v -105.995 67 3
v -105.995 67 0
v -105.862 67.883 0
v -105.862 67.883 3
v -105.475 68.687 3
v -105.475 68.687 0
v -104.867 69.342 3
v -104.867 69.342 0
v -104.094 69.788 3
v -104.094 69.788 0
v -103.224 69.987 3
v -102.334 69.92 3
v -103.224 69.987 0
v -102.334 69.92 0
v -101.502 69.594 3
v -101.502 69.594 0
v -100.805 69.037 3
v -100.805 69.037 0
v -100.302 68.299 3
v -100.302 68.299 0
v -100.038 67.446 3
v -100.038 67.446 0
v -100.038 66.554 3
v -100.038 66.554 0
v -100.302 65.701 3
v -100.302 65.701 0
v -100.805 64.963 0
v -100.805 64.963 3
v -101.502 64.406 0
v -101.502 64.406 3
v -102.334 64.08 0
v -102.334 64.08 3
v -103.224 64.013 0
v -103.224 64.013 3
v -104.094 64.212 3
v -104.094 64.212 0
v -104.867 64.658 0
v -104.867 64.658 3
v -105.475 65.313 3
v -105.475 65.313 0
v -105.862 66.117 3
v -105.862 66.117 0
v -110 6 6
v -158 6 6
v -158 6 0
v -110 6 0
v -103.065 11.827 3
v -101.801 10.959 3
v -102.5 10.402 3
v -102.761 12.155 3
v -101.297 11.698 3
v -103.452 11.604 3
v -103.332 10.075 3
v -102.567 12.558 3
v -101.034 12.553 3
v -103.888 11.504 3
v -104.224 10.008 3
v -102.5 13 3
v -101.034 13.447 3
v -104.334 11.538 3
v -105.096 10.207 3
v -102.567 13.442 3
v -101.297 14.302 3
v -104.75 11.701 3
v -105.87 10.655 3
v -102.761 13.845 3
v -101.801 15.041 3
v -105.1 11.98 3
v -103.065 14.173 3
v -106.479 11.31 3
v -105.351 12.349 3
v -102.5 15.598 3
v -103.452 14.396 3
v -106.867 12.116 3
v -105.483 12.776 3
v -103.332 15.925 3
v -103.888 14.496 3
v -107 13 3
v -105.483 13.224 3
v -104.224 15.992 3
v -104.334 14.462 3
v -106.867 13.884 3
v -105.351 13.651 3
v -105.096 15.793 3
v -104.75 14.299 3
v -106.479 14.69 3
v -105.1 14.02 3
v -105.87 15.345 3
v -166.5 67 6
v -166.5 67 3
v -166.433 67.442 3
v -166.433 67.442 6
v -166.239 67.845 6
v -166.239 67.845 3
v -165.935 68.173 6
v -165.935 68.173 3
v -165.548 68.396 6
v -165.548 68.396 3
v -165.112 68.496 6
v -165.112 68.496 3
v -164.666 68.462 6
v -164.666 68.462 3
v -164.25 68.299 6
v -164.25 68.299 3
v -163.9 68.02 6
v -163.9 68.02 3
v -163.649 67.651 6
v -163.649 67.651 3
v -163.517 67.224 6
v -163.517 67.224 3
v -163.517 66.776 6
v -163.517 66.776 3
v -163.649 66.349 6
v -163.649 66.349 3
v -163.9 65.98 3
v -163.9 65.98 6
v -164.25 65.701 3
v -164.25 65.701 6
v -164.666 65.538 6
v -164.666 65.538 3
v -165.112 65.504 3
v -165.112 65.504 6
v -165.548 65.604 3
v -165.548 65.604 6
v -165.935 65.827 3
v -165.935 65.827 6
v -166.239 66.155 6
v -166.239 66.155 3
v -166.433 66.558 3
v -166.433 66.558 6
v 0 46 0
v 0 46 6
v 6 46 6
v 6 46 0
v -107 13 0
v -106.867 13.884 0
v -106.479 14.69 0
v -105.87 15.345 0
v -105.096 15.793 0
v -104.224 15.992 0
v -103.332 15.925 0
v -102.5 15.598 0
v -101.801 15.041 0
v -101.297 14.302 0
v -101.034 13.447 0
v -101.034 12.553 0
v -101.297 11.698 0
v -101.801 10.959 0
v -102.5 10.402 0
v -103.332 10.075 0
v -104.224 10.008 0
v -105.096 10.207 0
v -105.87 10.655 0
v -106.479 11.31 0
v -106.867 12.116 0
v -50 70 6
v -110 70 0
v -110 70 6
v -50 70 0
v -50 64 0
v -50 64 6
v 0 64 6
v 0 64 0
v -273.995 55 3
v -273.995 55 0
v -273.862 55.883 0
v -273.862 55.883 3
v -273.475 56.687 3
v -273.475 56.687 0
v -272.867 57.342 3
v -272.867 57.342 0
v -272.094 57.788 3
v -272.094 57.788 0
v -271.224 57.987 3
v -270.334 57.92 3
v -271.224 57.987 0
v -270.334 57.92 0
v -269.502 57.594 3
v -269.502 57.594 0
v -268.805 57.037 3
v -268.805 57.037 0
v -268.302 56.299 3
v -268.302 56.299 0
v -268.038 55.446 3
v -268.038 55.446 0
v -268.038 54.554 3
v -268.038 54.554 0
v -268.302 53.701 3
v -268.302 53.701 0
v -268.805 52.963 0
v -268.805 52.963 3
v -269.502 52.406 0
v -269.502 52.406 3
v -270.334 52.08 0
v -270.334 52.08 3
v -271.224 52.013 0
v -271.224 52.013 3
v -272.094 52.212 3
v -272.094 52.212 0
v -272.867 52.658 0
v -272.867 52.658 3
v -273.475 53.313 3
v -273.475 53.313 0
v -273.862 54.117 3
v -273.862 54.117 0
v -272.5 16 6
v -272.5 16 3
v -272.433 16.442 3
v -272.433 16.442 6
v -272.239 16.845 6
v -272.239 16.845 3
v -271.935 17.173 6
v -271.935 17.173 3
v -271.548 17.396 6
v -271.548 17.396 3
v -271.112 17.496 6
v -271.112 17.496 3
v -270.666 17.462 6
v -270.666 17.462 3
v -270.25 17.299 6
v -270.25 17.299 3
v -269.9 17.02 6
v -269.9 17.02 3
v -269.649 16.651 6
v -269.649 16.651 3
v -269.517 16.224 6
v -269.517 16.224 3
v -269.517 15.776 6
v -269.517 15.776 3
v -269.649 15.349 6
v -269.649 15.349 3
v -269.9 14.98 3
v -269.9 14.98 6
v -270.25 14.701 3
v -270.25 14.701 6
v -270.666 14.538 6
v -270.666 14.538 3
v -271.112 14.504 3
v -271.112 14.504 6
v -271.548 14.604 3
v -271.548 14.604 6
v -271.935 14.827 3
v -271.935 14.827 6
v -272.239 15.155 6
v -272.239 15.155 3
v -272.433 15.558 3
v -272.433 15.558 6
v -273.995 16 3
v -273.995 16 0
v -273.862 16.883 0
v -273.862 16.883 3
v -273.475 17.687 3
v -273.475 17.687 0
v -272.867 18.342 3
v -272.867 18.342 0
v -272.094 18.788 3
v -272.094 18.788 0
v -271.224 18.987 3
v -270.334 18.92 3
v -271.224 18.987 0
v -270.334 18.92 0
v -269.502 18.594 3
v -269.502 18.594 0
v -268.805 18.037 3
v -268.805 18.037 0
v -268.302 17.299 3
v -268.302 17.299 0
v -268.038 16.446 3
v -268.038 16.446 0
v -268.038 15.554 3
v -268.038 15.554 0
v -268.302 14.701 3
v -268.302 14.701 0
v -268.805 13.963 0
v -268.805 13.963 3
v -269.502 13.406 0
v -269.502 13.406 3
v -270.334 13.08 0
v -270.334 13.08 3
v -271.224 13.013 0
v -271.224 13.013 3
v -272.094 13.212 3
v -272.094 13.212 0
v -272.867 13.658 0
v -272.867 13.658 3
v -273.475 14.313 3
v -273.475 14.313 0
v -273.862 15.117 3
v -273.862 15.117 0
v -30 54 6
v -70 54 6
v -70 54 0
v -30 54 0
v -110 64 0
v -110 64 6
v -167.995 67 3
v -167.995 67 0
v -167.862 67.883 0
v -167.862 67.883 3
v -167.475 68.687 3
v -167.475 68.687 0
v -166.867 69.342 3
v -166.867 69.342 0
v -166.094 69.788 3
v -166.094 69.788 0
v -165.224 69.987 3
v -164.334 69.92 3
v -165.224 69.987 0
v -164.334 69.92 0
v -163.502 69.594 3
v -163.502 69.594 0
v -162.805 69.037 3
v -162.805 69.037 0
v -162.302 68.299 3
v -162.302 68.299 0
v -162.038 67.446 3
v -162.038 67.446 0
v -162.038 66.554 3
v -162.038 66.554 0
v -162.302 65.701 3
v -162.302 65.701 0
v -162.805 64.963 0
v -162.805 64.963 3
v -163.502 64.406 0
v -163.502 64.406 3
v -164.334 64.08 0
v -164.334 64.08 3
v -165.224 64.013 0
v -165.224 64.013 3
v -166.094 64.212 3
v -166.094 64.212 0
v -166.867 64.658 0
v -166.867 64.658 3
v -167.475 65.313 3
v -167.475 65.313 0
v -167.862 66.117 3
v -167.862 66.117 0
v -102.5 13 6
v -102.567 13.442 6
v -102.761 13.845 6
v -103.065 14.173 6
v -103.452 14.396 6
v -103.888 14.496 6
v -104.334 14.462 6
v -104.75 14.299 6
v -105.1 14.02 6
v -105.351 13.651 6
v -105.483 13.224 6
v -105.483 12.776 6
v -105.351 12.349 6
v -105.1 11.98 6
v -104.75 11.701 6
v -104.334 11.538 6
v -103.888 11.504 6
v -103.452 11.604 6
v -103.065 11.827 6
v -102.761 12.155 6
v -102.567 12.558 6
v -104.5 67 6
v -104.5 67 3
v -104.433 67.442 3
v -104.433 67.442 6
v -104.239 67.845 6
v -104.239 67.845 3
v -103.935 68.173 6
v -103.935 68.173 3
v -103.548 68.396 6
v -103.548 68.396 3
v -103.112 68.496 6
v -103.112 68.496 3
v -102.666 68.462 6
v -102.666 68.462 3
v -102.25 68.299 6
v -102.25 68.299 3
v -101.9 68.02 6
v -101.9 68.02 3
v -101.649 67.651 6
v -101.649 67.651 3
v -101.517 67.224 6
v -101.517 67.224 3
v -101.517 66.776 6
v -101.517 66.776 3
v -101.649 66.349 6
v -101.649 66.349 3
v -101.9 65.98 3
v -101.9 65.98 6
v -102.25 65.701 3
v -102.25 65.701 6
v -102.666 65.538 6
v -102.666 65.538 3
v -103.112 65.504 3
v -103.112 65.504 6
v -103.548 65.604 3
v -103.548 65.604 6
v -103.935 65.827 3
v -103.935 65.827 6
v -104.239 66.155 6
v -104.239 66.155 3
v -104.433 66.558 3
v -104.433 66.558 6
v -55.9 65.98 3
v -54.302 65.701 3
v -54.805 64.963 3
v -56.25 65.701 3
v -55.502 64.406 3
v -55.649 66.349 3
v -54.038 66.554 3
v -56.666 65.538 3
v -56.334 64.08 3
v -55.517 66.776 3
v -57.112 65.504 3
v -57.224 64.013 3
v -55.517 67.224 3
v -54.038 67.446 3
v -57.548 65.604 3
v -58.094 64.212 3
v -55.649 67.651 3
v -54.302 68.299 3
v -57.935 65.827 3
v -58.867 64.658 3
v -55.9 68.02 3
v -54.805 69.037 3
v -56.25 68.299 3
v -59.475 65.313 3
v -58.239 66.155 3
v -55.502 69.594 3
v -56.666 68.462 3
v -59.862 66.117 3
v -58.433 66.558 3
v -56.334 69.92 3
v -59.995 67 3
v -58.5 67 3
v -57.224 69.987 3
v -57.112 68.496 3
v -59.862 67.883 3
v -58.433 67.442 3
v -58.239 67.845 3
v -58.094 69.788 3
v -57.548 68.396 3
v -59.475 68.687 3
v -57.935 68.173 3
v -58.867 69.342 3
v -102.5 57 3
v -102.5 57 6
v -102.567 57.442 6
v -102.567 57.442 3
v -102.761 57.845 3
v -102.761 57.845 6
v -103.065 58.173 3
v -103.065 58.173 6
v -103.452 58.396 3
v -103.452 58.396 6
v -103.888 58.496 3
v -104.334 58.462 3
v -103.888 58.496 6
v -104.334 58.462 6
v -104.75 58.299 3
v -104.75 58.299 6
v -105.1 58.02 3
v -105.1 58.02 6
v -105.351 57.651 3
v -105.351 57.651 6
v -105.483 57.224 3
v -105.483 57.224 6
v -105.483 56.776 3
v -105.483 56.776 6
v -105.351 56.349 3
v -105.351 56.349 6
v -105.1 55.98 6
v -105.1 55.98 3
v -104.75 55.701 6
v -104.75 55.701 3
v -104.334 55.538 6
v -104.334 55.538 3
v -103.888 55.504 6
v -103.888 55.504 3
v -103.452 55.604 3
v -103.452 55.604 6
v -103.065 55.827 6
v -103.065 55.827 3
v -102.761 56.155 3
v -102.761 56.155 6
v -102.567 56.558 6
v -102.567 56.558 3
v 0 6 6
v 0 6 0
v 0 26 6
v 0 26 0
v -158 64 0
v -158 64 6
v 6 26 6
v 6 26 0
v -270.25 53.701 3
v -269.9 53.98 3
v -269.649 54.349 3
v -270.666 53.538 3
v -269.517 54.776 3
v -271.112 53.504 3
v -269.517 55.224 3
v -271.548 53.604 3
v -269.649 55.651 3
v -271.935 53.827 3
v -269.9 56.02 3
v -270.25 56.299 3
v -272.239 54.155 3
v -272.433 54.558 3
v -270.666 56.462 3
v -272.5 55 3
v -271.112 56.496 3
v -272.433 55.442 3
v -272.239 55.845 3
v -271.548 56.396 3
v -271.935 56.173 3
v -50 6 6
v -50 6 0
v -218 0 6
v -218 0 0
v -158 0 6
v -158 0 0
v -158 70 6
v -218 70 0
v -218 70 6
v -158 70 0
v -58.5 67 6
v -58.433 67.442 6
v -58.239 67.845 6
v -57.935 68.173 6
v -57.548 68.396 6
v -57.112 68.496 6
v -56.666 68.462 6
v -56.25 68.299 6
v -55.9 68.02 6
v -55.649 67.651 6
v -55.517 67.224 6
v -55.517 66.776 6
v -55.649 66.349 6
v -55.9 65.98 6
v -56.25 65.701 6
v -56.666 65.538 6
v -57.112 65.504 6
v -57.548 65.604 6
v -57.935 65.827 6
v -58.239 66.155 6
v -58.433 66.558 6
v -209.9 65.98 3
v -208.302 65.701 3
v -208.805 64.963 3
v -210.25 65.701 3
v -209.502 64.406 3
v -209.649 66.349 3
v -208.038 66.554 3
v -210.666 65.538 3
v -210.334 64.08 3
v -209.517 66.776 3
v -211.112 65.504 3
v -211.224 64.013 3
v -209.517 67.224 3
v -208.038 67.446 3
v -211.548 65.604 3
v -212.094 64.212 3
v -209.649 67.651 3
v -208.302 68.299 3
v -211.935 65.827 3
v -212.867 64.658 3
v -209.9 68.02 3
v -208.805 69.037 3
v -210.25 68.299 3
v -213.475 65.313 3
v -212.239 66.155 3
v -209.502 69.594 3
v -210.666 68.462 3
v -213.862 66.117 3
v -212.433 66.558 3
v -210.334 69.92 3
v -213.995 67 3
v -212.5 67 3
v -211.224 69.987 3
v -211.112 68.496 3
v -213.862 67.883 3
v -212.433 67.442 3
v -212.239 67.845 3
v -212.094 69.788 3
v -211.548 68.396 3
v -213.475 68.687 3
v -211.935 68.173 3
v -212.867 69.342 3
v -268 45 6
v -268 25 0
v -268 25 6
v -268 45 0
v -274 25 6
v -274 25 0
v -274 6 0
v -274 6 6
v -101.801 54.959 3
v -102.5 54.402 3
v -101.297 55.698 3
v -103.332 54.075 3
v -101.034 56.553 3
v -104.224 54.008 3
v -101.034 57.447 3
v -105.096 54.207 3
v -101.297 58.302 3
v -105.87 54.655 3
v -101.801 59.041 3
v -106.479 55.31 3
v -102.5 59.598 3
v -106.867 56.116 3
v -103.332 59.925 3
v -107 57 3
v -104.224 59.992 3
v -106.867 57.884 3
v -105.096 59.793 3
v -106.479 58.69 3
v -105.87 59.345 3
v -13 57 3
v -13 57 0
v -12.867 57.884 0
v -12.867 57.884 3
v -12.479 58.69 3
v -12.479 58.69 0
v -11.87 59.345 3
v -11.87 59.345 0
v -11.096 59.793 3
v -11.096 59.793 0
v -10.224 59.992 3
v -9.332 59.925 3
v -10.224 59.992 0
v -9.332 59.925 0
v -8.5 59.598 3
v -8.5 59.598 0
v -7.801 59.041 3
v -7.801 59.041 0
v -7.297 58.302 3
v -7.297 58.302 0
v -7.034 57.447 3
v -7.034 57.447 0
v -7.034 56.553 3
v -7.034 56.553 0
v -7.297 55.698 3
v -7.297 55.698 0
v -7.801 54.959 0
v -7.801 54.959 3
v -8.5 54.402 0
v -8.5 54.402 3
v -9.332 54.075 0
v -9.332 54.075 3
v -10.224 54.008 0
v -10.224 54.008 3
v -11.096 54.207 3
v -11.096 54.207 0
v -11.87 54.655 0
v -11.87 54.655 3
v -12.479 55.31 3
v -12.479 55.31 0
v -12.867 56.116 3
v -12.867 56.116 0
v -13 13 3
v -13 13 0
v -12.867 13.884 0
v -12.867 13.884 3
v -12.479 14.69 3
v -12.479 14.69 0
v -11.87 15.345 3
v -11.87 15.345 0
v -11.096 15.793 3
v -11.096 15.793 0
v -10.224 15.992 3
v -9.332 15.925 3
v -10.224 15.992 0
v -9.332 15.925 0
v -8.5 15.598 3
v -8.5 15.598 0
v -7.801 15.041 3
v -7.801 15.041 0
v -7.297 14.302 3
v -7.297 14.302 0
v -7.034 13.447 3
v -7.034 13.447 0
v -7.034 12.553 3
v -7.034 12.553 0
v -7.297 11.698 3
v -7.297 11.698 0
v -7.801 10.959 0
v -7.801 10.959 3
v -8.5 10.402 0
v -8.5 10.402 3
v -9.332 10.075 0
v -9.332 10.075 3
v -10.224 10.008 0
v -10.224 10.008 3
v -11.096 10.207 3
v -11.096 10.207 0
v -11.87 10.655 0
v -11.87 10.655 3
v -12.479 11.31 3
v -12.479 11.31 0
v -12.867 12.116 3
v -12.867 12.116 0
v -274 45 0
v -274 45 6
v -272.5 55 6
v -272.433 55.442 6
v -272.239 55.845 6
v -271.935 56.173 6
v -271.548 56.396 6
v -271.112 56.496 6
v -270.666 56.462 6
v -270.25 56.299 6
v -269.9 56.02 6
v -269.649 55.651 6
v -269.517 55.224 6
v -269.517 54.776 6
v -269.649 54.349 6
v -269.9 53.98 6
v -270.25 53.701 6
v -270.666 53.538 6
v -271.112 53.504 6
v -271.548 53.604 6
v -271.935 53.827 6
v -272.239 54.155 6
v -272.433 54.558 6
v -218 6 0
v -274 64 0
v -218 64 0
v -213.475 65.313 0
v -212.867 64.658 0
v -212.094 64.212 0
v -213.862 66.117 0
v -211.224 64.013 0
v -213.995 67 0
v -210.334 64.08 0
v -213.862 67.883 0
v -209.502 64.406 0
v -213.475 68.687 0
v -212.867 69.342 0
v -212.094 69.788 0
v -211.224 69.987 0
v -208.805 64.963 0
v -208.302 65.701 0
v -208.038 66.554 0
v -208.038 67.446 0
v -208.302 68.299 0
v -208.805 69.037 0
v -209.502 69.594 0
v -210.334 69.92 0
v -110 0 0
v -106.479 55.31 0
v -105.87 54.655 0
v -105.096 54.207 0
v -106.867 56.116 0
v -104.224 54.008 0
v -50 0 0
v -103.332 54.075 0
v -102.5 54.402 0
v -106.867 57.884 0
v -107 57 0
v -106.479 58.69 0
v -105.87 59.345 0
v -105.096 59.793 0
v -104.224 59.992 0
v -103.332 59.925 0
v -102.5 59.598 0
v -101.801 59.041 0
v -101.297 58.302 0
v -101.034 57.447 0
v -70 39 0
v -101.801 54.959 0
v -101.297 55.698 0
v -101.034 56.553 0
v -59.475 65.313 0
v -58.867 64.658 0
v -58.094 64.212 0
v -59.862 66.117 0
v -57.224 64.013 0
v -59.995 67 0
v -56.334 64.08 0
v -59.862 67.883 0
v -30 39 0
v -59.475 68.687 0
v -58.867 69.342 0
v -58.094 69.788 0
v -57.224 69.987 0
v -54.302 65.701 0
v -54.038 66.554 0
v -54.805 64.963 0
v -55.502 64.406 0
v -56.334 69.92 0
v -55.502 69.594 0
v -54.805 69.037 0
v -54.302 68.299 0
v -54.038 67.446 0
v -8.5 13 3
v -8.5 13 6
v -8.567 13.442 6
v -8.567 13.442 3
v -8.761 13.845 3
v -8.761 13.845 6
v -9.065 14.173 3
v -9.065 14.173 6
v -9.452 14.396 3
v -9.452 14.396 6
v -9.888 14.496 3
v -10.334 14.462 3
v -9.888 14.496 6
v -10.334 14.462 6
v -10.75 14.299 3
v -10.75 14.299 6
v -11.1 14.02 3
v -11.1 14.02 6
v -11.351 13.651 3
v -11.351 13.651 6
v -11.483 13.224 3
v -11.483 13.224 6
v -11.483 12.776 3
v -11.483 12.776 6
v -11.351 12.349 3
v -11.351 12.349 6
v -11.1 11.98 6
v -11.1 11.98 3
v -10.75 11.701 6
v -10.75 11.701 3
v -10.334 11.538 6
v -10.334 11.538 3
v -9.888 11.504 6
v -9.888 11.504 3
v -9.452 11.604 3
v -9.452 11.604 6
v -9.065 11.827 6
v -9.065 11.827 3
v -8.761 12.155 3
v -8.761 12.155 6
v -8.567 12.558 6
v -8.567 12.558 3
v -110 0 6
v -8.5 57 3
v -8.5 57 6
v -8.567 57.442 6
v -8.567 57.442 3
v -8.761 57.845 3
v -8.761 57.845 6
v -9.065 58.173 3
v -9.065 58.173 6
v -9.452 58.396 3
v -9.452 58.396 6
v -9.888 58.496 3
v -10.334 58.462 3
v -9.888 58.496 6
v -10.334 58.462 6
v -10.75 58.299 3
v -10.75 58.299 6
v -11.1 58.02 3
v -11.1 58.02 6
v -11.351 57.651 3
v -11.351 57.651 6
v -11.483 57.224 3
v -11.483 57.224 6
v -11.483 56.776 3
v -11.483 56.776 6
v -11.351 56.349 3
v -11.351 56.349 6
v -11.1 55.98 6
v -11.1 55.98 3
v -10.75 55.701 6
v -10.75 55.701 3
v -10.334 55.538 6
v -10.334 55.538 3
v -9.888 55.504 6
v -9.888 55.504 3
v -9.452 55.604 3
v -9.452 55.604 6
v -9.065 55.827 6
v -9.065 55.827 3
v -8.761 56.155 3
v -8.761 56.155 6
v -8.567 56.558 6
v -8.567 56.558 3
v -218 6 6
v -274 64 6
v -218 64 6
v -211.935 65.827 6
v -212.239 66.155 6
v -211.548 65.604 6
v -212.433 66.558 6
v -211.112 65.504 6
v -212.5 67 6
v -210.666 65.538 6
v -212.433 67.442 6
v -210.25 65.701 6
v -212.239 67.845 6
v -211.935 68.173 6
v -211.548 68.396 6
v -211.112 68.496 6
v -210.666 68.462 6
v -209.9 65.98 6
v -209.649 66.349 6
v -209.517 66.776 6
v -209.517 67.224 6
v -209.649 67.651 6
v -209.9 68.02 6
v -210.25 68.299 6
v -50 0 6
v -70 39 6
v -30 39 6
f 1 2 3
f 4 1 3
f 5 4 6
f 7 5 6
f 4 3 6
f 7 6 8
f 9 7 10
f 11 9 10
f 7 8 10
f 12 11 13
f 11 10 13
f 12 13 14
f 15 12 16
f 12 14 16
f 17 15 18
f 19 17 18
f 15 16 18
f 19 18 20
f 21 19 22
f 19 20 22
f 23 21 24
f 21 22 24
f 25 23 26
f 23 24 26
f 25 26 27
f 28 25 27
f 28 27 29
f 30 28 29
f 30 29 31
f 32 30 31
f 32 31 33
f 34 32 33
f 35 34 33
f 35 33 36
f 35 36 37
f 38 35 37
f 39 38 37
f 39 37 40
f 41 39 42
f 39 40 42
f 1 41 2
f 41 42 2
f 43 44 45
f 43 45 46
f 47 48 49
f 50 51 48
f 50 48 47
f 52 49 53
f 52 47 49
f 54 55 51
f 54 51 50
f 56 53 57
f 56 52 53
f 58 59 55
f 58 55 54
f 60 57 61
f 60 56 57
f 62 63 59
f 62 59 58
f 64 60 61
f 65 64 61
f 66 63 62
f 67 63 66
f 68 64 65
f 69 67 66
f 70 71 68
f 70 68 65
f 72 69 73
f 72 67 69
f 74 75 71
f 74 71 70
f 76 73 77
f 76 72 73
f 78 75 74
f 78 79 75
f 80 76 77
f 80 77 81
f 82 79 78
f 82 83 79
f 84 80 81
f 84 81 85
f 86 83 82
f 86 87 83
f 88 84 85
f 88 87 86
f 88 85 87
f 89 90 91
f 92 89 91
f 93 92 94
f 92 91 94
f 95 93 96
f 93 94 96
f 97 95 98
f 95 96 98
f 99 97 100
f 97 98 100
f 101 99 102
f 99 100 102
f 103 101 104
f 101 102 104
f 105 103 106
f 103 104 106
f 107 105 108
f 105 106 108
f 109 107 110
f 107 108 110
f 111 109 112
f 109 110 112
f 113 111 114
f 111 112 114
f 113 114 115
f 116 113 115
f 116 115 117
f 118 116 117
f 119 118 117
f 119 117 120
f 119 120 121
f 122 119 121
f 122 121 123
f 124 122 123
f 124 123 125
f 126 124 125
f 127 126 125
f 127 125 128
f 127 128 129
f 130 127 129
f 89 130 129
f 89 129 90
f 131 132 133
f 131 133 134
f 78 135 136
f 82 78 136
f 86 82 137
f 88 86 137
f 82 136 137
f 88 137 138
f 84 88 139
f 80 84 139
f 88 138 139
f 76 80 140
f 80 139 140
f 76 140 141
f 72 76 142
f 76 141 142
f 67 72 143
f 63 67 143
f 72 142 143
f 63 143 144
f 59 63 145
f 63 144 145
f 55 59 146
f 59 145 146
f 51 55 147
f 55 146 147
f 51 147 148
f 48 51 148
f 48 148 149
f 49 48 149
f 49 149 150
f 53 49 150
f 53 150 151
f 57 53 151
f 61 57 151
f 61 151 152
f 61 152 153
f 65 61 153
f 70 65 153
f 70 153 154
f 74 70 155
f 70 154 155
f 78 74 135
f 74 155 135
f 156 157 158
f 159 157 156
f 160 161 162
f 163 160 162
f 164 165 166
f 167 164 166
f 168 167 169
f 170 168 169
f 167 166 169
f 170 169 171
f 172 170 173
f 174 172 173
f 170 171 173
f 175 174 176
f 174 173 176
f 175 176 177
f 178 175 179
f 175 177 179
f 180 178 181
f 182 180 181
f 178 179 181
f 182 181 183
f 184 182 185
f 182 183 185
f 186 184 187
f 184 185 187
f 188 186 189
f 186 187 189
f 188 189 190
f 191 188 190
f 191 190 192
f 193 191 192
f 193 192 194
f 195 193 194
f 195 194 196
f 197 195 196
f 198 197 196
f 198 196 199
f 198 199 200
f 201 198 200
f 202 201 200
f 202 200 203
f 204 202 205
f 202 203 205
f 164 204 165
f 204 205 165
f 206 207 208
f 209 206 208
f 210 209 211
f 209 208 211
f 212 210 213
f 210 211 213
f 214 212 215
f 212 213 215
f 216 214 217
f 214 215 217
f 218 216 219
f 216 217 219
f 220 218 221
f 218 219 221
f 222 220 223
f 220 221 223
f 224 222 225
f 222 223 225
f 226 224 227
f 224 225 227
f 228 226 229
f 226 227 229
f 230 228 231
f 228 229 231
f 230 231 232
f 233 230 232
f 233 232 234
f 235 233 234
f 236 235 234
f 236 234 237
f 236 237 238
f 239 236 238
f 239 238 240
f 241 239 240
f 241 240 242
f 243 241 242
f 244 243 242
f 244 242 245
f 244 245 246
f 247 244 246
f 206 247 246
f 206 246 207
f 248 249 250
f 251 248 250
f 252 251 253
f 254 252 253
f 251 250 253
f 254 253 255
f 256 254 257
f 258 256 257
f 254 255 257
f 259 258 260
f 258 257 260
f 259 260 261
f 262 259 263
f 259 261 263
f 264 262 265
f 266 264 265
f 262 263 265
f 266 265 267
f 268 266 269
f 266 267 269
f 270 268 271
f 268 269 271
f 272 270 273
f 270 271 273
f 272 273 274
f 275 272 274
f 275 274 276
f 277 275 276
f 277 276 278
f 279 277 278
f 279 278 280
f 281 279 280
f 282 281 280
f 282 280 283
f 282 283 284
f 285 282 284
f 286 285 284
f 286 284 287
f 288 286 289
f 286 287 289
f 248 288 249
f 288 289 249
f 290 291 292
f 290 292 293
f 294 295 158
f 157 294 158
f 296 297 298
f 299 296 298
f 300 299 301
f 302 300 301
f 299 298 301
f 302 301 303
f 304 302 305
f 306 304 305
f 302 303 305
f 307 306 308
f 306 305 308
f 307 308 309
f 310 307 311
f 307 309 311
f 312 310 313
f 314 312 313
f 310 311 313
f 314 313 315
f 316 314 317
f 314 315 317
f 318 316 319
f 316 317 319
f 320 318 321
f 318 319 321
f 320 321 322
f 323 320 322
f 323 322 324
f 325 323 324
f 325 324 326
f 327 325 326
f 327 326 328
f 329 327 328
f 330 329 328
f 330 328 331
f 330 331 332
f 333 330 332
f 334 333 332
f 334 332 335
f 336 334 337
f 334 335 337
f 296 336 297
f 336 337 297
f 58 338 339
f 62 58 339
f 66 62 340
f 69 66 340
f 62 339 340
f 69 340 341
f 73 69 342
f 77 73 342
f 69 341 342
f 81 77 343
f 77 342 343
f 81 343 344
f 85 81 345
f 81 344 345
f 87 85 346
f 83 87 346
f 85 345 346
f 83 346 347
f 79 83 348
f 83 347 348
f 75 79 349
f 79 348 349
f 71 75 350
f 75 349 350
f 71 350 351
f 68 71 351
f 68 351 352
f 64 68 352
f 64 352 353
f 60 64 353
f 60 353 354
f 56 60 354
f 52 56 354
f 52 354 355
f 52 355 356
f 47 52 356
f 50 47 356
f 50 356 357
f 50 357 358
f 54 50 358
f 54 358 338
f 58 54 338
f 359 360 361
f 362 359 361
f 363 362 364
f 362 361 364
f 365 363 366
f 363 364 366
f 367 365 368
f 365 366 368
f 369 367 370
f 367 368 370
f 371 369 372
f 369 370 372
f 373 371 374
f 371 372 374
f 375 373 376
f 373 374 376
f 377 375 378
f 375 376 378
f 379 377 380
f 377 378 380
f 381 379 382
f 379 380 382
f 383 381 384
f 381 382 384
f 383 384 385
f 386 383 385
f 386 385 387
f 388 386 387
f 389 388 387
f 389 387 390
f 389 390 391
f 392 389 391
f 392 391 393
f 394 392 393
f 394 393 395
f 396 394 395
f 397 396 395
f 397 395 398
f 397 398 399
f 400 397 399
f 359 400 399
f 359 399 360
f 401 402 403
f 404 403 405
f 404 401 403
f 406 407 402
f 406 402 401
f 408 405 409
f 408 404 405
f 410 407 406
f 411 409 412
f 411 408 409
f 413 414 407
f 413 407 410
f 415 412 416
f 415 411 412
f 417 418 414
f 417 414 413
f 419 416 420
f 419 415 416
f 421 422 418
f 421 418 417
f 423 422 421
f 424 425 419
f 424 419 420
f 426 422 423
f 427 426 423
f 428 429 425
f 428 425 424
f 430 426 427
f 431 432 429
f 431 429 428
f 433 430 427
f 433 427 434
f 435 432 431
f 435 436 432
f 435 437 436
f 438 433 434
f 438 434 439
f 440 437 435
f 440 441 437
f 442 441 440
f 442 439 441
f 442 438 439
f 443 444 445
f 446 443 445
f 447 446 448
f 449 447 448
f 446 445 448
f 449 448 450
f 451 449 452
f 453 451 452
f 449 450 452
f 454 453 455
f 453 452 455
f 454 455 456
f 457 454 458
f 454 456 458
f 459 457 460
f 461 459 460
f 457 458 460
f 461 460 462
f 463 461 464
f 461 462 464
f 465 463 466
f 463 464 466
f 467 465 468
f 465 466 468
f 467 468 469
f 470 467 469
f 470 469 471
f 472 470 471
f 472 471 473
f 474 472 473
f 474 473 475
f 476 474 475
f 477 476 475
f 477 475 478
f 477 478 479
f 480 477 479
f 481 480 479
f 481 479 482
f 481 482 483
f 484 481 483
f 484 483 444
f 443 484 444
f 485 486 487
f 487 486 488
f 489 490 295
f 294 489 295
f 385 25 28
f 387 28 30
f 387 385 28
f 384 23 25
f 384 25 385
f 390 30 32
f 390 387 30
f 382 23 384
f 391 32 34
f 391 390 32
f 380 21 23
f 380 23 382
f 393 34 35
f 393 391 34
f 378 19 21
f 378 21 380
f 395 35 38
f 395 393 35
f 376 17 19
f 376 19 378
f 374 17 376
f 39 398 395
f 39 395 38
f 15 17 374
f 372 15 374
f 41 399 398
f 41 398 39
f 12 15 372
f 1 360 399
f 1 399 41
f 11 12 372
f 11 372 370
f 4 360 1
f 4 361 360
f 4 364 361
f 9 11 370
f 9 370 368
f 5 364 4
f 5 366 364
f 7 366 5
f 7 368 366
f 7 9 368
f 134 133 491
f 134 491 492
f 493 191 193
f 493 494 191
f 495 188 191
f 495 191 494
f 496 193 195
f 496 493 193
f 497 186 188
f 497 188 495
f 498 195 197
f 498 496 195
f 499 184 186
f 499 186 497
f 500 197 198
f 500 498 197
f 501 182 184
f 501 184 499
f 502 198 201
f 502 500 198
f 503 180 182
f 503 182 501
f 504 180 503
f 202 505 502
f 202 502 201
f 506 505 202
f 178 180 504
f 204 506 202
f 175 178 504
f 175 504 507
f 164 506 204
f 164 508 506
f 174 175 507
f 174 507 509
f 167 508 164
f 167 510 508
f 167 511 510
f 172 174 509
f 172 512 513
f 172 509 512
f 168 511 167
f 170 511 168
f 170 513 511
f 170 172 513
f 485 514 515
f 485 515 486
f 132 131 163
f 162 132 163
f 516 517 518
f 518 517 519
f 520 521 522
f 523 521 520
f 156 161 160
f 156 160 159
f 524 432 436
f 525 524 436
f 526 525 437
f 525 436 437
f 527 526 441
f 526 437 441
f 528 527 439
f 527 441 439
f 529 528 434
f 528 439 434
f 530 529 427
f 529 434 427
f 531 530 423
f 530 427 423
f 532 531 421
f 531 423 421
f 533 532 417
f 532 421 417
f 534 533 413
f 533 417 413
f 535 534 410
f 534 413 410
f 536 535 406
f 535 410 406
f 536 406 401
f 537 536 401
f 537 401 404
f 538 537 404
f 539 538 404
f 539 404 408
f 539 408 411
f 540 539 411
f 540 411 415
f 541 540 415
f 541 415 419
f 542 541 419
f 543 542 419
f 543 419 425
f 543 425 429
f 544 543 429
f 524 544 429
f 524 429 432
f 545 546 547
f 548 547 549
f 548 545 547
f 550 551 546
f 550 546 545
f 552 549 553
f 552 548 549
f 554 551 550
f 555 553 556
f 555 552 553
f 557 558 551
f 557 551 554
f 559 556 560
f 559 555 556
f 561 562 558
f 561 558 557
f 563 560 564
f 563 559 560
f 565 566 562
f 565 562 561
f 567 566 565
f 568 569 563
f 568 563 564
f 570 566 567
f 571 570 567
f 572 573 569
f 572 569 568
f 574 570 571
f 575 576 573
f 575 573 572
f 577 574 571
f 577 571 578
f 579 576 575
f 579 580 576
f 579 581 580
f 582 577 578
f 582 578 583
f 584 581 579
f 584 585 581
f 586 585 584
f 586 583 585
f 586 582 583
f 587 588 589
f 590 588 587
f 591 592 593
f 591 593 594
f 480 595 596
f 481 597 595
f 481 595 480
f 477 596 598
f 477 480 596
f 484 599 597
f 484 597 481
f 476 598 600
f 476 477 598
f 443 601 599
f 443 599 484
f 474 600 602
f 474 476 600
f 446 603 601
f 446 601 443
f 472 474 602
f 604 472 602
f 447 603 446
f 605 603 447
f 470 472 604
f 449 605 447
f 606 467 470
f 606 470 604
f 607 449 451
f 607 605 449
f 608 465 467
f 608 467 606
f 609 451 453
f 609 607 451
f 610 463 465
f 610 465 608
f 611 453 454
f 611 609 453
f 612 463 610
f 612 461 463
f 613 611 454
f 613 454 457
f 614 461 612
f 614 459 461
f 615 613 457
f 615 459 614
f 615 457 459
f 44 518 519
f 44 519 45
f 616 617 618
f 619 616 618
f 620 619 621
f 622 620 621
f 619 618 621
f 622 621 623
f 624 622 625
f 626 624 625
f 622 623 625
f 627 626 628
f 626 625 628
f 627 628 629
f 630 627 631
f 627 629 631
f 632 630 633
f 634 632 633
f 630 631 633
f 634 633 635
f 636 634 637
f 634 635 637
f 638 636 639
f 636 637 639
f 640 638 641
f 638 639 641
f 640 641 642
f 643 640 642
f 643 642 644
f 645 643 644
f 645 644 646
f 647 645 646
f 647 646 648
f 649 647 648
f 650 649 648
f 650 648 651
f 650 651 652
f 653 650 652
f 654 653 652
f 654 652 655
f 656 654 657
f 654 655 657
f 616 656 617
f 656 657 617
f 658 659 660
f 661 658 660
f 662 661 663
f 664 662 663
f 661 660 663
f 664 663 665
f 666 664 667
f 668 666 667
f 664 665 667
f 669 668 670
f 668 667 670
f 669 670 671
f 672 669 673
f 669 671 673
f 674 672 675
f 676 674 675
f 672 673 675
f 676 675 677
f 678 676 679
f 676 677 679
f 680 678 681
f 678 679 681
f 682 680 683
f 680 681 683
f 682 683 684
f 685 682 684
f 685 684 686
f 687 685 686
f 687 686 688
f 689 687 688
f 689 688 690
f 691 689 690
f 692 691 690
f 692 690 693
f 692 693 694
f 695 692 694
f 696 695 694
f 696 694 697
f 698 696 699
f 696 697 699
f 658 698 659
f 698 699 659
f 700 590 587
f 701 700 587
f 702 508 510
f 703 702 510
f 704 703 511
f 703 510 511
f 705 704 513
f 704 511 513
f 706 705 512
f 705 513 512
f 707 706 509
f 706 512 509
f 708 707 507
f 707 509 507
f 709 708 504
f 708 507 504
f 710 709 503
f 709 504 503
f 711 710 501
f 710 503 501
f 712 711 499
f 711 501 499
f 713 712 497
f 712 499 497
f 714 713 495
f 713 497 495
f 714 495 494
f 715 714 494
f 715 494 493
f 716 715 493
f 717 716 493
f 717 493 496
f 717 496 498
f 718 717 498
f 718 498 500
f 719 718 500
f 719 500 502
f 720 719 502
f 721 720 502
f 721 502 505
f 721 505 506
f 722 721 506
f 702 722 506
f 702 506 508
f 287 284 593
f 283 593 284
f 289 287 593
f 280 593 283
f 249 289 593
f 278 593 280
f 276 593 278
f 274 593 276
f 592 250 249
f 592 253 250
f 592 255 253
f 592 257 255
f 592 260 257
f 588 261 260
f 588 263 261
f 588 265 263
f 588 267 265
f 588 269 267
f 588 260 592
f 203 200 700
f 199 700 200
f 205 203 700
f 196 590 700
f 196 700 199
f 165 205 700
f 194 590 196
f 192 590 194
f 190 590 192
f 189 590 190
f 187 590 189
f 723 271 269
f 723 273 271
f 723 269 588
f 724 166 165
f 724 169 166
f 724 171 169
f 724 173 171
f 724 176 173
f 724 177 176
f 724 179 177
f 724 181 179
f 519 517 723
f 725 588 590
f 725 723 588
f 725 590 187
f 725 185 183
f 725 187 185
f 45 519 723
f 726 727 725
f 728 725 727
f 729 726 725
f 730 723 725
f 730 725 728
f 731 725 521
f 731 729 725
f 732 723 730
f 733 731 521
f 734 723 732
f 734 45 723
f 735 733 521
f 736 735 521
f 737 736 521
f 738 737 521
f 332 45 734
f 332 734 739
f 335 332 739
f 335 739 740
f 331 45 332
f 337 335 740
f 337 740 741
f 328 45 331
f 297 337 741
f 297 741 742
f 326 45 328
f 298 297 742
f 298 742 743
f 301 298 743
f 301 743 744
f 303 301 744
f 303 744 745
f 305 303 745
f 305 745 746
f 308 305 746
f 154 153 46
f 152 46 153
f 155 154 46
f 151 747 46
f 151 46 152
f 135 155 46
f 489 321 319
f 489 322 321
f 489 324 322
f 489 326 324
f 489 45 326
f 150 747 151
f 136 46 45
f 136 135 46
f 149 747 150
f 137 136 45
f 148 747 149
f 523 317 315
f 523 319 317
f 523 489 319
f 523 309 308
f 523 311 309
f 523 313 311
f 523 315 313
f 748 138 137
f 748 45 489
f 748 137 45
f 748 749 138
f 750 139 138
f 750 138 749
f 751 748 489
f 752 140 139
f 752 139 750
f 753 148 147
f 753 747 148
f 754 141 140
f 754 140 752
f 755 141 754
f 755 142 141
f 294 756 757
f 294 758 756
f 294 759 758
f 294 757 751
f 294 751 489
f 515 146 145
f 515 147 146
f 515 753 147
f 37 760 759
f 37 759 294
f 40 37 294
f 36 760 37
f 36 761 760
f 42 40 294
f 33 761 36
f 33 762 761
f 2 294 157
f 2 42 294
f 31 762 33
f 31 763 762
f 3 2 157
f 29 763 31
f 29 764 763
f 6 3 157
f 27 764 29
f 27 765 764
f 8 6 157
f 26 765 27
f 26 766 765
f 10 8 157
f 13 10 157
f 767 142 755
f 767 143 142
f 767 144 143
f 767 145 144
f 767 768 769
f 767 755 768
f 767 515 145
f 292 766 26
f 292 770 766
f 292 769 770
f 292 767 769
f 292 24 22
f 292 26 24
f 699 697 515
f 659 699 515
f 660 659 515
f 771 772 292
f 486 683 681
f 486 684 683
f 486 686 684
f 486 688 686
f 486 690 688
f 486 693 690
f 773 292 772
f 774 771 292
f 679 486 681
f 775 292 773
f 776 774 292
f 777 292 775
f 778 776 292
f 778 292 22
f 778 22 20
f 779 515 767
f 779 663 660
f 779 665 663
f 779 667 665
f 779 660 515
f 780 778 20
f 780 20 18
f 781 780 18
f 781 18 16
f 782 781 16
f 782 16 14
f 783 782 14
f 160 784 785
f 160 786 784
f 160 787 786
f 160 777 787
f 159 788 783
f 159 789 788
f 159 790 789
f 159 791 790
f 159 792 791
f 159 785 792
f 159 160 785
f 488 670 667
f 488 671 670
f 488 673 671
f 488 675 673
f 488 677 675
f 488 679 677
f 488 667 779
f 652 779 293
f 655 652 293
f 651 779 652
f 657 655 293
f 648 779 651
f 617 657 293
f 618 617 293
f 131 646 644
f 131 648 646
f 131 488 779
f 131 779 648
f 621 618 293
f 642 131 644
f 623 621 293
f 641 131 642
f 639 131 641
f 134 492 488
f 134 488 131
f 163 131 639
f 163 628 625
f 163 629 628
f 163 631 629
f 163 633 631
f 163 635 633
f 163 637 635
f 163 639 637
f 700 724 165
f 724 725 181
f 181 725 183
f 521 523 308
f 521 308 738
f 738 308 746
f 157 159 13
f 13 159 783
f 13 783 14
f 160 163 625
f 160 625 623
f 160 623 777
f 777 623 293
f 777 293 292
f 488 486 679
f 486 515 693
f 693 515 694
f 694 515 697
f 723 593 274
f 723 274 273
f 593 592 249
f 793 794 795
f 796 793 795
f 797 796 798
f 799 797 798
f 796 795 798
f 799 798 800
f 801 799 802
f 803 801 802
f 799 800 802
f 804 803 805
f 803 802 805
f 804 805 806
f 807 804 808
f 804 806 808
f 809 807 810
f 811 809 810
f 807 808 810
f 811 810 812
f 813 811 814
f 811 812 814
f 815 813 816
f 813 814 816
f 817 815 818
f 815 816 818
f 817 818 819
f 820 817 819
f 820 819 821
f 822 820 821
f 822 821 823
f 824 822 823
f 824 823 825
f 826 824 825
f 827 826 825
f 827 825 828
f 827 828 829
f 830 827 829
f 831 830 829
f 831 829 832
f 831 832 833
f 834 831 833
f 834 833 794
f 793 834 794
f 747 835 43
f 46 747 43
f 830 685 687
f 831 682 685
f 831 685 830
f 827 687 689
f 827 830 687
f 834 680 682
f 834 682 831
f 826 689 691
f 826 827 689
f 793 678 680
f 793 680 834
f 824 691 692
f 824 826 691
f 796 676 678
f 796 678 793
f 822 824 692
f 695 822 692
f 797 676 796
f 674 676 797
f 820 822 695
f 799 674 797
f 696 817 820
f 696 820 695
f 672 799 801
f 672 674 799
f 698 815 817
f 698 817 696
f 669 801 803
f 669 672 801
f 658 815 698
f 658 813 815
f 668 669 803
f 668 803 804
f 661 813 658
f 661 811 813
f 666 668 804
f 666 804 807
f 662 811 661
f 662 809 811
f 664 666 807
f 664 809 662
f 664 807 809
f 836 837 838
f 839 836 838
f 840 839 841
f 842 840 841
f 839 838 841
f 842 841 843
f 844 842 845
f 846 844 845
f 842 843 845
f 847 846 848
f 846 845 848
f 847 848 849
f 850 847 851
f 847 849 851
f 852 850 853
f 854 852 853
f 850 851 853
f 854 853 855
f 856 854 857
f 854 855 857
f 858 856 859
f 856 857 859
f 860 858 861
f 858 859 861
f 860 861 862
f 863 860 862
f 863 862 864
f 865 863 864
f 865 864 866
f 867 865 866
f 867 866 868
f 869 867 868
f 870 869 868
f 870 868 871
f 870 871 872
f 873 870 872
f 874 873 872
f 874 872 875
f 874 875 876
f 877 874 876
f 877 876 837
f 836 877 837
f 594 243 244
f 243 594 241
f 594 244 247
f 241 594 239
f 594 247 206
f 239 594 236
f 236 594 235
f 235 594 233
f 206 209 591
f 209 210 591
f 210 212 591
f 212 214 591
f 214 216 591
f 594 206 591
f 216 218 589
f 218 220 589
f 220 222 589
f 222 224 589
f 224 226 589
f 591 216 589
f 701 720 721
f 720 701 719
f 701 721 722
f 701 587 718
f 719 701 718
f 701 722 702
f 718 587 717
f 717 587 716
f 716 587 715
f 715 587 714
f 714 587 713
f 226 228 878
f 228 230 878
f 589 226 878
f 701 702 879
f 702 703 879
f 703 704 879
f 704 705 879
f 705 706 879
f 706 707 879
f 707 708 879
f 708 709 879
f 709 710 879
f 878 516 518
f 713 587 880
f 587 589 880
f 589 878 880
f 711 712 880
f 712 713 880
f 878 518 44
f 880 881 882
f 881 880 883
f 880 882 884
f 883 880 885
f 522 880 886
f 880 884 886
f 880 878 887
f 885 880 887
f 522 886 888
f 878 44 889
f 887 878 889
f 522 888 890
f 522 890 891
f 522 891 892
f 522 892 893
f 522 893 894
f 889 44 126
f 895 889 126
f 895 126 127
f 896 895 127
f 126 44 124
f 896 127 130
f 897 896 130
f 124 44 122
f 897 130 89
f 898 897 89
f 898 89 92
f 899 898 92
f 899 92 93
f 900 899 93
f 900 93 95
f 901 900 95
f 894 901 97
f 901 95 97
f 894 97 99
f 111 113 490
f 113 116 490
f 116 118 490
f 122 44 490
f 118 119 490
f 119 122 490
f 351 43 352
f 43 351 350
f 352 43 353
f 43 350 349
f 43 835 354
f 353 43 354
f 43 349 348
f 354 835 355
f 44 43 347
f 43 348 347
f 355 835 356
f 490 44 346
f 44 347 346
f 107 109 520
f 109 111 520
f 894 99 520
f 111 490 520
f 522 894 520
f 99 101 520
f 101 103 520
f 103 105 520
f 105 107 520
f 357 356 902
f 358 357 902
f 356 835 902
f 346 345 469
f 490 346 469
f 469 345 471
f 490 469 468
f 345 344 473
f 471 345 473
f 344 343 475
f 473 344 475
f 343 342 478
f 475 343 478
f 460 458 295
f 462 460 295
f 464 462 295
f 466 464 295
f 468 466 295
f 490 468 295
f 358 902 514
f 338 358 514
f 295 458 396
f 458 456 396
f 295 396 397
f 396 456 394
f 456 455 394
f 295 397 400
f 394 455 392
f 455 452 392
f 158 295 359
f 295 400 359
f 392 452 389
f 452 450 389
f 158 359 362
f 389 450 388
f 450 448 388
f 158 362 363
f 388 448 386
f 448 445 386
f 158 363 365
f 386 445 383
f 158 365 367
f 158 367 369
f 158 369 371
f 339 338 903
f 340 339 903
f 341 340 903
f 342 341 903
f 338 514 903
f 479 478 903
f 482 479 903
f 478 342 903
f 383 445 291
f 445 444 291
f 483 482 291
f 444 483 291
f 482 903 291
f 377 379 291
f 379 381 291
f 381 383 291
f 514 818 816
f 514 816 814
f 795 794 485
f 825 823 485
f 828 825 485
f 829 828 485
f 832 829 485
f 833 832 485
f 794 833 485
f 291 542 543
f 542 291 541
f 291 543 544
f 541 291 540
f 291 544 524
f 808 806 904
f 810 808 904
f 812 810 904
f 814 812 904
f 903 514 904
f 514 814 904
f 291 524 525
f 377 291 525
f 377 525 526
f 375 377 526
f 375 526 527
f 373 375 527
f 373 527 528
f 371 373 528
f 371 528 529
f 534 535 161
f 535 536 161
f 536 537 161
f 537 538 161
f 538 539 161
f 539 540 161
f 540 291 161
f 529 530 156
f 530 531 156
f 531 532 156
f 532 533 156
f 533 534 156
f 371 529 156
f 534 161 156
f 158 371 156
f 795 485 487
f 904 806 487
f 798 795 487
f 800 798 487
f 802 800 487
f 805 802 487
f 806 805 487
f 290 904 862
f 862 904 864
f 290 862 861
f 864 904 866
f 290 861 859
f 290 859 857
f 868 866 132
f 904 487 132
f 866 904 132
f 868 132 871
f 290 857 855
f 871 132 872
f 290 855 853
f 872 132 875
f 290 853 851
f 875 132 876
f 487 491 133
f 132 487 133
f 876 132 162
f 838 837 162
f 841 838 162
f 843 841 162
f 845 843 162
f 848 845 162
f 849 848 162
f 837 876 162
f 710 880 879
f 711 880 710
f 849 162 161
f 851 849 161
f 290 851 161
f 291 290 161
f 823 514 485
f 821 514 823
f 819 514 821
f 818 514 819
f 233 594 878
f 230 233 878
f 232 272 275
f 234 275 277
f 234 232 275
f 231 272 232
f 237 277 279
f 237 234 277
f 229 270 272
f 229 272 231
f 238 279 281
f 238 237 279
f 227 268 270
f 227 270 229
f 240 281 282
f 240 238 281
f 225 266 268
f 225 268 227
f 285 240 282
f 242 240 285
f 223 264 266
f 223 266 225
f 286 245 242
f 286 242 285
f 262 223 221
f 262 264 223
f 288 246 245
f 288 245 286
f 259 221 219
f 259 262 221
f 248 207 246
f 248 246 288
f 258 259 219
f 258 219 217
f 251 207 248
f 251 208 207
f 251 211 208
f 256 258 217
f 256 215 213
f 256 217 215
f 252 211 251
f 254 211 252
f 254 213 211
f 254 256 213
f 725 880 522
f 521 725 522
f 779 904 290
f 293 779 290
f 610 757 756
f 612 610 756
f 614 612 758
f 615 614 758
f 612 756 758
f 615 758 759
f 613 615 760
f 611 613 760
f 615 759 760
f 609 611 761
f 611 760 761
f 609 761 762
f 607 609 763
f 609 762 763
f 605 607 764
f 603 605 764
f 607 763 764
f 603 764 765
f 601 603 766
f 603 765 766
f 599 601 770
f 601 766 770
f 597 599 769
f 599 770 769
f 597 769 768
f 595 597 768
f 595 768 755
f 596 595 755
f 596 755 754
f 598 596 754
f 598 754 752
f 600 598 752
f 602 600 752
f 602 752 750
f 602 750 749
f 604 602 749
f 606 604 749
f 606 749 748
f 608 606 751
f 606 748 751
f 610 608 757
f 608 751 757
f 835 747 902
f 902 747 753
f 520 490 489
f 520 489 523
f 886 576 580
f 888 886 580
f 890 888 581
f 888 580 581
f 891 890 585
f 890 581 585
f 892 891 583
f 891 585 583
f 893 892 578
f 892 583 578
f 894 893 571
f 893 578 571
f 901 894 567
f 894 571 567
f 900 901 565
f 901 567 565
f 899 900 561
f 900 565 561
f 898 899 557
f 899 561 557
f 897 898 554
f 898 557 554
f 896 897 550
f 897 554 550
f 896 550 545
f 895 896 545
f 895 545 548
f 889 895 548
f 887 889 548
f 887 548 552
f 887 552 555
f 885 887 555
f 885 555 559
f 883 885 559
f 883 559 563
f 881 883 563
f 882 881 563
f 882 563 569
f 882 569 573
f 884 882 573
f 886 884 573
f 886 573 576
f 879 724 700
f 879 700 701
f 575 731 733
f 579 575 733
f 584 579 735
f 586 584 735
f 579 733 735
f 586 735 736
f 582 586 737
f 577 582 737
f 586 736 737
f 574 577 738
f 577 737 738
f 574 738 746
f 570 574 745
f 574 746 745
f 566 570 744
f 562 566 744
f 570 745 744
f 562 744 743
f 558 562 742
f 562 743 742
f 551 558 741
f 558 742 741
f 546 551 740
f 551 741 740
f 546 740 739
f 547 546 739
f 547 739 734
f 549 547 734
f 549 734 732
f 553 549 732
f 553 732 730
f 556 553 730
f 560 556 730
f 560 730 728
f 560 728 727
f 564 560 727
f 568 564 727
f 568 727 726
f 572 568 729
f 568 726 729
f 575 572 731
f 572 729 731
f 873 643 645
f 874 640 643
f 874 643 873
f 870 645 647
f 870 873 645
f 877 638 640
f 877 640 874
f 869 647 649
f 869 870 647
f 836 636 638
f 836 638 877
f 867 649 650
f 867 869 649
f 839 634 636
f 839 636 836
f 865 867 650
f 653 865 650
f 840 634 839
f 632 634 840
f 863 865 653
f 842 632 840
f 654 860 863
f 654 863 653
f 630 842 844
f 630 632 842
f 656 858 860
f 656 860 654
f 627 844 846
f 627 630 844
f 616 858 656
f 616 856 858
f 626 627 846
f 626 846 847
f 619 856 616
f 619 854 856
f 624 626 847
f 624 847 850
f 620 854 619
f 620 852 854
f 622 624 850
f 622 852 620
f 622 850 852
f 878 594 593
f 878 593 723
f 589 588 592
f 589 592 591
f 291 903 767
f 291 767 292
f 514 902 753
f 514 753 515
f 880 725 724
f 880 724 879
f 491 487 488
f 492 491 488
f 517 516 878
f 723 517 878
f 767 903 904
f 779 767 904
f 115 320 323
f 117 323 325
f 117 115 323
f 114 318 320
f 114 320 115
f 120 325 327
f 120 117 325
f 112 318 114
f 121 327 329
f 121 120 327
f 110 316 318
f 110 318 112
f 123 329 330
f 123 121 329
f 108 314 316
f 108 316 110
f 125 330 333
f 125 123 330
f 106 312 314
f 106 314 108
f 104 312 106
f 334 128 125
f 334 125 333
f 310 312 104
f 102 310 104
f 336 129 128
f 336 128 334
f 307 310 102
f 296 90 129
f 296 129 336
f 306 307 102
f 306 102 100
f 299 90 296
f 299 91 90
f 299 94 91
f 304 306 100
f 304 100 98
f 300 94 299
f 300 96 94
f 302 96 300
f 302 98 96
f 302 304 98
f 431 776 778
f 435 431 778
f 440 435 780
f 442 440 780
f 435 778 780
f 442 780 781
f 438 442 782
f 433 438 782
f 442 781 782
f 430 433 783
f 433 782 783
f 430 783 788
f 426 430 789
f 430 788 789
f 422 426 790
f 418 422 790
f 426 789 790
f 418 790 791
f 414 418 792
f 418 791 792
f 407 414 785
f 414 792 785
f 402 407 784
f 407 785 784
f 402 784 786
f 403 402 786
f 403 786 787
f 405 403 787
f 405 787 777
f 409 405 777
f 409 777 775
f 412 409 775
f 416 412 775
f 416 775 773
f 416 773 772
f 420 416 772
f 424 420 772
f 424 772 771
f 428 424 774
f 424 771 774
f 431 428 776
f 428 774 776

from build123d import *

# Parameters (mm, degrees)
ESQUISSE1_W             = 268
ESQUISSE1_H             = 70
BOSS_EXTRU_1_DEPTH      = 6
ESQUISSE2_W             = 50
ESQUISSE2_H             = 6
ESQUISSE2_W_2           = 48
ENL_V_MAT_EXTRU_1_DEPTH = 278.055951028
ESQUISSE3_W             = 6
ESQUISSE3_H             = 20
BOSS_EXTRU_2_DEPTH      = 6
ESQUISSE4_R             = 1.5
ESQUISSE4_W             = 40
ESQUISSE4_H             = 15
ENL_V_MAT_EXTRU_2_DEPTH = 10
ESQUISSE5_W             = 6
ESQUISSE5_H             = 19
BOSS_EXTRU_3_DEPTH      = 6
ESQUISSE6_R             = 1.5
ENL_V_MAT_EXTRU_3_DEPTH = 283.863924883
ESQUISSE7_R             = 2.995
ESQUISSE7_R_2           = 3
ENL_V_MAT_EXTRU_4_DEPTH = 3


with BuildPart() as part:
    # Esquisse1 → Boss.-Extru.1 (new body)
    with BuildSketch(Plane.XY):
        with Locations((-134, 35)):
            Rectangle(ESQUISSE1_W, ESQUISSE1_H)
    extrude(amount=BOSS_EXTRU_1_DEPTH)

    # Esquisse2 → Enlèv. mat.-Extru.1 (cut, through all)
    with BuildSketch(Plane.XY.offset(6)):
        with Locations((-243, 3)):
            Rectangle(ESQUISSE2_W, ESQUISSE2_H)
        with Locations((-25, 3)):
            Rectangle(ESQUISSE2_W, ESQUISSE2_H)
        with Locations((-134, 3)):
            Rectangle(ESQUISSE2_W_2, ESQUISSE2_H)
        with Locations((-243, 67)):
            Rectangle(ESQUISSE2_W, ESQUISSE2_H)
        with Locations((-134, 67)):
            Rectangle(ESQUISSE2_W_2, ESQUISSE2_H)
        with Locations((-25, 67)):
            Rectangle(ESQUISSE2_W, ESQUISSE2_H)
    extrude(amount=-ENL_V_MAT_EXTRU_1_DEPTH, mode=Mode.SUBTRACT)

    # Esquisse3 → Boss.-Extru.2 (add)
    with BuildSketch(Plane(origin=(0, 0, 0), x_dir=(0, 0, -1), z_dir=(1, 0, 0))):
        with Locations((-3, 36)):
            Rectangle(ESQUISSE3_W, ESQUISSE3_H)
    extrude(amount=BOSS_EXTRU_2_DEPTH)

    # Esquisse4 → Enlèv. mat.-Extru.2 (cut)
    with BuildSketch(Plane.XY.offset(6)):
        with Locations((-104, 57)):
            Circle(ESQUISSE4_R)
        with Locations((-104, 13)):
            Circle(ESQUISSE4_R)
        with Locations((-10, 57)):
            Circle(ESQUISSE4_R)
        with Locations((-10, 13)):
            Circle(ESQUISSE4_R)
        with Locations((-50, 46.5)):
            Rectangle(ESQUISSE4_W, ESQUISSE4_H)
    extrude(amount=-ENL_V_MAT_EXTRU_2_DEPTH, mode=Mode.SUBTRACT)

    # Esquisse5 → Boss.-Extru.3 (add)
    with BuildSketch(Plane.ZY.offset(268)):
        with Locations((3, 54.5)):
            Rectangle(ESQUISSE5_W, ESQUISSE5_H)
        with Locations((3, 15.5)):
            Rectangle(ESQUISSE5_W, ESQUISSE5_H)
    extrude(amount=BOSS_EXTRU_3_DEPTH)

    # Esquisse6 → Enlèv. mat.-Extru.3 (cut, through all)
    with BuildSketch(Plane(origin=(0, 0, 0), x_dir=(-1, 0, 0), z_dir=(0, 0, -1))):
        with Locations((271, 16)):
            Circle(ESQUISSE6_R)
        with Locations((271, 55)):
            Circle(ESQUISSE6_R)
        with Locations((211, 67)):
            Circle(ESQUISSE6_R)
        with Locations((165, 67)):
            Circle(ESQUISSE6_R)
        with Locations((103, 67)):
            Circle(ESQUISSE6_R)
        with Locations((57, 67)):
            Circle(ESQUISSE6_R)
    extrude(amount=-ENL_V_MAT_EXTRU_3_DEPTH, mode=Mode.SUBTRACT)

    # Esquisse7 → Enlèv. mat.-Extru.4 (cut)
    with BuildSketch(Plane(origin=(0, 0, 0), x_dir=(-1, 0, 0), z_dir=(0, 0, -1))):
        with Locations((271, 16)):
            Circle(ESQUISSE7_R)
        with Locations((271, 55)):
            Circle(ESQUISSE7_R)
        with Locations((211, 67)):
            Circle(ESQUISSE7_R)
        with Locations((165, 67)):
            Circle(ESQUISSE7_R)
        with Locations((103, 67)):
            Circle(ESQUISSE7_R)
        with Locations((57, 67)):
            Circle(ESQUISSE7_R)
        with Locations((104, 57)):
            Circle(ESQUISSE7_R_2)
        with Locations((104, 13)):
            Circle(ESQUISSE7_R_2)
        with Locations((10, 13)):
            Circle(ESQUISSE7_R_2)
        with Locations((10, 57)):
            Circle(ESQUISSE7_R_2)
    extrude(amount=-ENL_V_MAT_EXTRU_4_DEPTH, mode=Mode.SUBTRACT)


solid = part.part
